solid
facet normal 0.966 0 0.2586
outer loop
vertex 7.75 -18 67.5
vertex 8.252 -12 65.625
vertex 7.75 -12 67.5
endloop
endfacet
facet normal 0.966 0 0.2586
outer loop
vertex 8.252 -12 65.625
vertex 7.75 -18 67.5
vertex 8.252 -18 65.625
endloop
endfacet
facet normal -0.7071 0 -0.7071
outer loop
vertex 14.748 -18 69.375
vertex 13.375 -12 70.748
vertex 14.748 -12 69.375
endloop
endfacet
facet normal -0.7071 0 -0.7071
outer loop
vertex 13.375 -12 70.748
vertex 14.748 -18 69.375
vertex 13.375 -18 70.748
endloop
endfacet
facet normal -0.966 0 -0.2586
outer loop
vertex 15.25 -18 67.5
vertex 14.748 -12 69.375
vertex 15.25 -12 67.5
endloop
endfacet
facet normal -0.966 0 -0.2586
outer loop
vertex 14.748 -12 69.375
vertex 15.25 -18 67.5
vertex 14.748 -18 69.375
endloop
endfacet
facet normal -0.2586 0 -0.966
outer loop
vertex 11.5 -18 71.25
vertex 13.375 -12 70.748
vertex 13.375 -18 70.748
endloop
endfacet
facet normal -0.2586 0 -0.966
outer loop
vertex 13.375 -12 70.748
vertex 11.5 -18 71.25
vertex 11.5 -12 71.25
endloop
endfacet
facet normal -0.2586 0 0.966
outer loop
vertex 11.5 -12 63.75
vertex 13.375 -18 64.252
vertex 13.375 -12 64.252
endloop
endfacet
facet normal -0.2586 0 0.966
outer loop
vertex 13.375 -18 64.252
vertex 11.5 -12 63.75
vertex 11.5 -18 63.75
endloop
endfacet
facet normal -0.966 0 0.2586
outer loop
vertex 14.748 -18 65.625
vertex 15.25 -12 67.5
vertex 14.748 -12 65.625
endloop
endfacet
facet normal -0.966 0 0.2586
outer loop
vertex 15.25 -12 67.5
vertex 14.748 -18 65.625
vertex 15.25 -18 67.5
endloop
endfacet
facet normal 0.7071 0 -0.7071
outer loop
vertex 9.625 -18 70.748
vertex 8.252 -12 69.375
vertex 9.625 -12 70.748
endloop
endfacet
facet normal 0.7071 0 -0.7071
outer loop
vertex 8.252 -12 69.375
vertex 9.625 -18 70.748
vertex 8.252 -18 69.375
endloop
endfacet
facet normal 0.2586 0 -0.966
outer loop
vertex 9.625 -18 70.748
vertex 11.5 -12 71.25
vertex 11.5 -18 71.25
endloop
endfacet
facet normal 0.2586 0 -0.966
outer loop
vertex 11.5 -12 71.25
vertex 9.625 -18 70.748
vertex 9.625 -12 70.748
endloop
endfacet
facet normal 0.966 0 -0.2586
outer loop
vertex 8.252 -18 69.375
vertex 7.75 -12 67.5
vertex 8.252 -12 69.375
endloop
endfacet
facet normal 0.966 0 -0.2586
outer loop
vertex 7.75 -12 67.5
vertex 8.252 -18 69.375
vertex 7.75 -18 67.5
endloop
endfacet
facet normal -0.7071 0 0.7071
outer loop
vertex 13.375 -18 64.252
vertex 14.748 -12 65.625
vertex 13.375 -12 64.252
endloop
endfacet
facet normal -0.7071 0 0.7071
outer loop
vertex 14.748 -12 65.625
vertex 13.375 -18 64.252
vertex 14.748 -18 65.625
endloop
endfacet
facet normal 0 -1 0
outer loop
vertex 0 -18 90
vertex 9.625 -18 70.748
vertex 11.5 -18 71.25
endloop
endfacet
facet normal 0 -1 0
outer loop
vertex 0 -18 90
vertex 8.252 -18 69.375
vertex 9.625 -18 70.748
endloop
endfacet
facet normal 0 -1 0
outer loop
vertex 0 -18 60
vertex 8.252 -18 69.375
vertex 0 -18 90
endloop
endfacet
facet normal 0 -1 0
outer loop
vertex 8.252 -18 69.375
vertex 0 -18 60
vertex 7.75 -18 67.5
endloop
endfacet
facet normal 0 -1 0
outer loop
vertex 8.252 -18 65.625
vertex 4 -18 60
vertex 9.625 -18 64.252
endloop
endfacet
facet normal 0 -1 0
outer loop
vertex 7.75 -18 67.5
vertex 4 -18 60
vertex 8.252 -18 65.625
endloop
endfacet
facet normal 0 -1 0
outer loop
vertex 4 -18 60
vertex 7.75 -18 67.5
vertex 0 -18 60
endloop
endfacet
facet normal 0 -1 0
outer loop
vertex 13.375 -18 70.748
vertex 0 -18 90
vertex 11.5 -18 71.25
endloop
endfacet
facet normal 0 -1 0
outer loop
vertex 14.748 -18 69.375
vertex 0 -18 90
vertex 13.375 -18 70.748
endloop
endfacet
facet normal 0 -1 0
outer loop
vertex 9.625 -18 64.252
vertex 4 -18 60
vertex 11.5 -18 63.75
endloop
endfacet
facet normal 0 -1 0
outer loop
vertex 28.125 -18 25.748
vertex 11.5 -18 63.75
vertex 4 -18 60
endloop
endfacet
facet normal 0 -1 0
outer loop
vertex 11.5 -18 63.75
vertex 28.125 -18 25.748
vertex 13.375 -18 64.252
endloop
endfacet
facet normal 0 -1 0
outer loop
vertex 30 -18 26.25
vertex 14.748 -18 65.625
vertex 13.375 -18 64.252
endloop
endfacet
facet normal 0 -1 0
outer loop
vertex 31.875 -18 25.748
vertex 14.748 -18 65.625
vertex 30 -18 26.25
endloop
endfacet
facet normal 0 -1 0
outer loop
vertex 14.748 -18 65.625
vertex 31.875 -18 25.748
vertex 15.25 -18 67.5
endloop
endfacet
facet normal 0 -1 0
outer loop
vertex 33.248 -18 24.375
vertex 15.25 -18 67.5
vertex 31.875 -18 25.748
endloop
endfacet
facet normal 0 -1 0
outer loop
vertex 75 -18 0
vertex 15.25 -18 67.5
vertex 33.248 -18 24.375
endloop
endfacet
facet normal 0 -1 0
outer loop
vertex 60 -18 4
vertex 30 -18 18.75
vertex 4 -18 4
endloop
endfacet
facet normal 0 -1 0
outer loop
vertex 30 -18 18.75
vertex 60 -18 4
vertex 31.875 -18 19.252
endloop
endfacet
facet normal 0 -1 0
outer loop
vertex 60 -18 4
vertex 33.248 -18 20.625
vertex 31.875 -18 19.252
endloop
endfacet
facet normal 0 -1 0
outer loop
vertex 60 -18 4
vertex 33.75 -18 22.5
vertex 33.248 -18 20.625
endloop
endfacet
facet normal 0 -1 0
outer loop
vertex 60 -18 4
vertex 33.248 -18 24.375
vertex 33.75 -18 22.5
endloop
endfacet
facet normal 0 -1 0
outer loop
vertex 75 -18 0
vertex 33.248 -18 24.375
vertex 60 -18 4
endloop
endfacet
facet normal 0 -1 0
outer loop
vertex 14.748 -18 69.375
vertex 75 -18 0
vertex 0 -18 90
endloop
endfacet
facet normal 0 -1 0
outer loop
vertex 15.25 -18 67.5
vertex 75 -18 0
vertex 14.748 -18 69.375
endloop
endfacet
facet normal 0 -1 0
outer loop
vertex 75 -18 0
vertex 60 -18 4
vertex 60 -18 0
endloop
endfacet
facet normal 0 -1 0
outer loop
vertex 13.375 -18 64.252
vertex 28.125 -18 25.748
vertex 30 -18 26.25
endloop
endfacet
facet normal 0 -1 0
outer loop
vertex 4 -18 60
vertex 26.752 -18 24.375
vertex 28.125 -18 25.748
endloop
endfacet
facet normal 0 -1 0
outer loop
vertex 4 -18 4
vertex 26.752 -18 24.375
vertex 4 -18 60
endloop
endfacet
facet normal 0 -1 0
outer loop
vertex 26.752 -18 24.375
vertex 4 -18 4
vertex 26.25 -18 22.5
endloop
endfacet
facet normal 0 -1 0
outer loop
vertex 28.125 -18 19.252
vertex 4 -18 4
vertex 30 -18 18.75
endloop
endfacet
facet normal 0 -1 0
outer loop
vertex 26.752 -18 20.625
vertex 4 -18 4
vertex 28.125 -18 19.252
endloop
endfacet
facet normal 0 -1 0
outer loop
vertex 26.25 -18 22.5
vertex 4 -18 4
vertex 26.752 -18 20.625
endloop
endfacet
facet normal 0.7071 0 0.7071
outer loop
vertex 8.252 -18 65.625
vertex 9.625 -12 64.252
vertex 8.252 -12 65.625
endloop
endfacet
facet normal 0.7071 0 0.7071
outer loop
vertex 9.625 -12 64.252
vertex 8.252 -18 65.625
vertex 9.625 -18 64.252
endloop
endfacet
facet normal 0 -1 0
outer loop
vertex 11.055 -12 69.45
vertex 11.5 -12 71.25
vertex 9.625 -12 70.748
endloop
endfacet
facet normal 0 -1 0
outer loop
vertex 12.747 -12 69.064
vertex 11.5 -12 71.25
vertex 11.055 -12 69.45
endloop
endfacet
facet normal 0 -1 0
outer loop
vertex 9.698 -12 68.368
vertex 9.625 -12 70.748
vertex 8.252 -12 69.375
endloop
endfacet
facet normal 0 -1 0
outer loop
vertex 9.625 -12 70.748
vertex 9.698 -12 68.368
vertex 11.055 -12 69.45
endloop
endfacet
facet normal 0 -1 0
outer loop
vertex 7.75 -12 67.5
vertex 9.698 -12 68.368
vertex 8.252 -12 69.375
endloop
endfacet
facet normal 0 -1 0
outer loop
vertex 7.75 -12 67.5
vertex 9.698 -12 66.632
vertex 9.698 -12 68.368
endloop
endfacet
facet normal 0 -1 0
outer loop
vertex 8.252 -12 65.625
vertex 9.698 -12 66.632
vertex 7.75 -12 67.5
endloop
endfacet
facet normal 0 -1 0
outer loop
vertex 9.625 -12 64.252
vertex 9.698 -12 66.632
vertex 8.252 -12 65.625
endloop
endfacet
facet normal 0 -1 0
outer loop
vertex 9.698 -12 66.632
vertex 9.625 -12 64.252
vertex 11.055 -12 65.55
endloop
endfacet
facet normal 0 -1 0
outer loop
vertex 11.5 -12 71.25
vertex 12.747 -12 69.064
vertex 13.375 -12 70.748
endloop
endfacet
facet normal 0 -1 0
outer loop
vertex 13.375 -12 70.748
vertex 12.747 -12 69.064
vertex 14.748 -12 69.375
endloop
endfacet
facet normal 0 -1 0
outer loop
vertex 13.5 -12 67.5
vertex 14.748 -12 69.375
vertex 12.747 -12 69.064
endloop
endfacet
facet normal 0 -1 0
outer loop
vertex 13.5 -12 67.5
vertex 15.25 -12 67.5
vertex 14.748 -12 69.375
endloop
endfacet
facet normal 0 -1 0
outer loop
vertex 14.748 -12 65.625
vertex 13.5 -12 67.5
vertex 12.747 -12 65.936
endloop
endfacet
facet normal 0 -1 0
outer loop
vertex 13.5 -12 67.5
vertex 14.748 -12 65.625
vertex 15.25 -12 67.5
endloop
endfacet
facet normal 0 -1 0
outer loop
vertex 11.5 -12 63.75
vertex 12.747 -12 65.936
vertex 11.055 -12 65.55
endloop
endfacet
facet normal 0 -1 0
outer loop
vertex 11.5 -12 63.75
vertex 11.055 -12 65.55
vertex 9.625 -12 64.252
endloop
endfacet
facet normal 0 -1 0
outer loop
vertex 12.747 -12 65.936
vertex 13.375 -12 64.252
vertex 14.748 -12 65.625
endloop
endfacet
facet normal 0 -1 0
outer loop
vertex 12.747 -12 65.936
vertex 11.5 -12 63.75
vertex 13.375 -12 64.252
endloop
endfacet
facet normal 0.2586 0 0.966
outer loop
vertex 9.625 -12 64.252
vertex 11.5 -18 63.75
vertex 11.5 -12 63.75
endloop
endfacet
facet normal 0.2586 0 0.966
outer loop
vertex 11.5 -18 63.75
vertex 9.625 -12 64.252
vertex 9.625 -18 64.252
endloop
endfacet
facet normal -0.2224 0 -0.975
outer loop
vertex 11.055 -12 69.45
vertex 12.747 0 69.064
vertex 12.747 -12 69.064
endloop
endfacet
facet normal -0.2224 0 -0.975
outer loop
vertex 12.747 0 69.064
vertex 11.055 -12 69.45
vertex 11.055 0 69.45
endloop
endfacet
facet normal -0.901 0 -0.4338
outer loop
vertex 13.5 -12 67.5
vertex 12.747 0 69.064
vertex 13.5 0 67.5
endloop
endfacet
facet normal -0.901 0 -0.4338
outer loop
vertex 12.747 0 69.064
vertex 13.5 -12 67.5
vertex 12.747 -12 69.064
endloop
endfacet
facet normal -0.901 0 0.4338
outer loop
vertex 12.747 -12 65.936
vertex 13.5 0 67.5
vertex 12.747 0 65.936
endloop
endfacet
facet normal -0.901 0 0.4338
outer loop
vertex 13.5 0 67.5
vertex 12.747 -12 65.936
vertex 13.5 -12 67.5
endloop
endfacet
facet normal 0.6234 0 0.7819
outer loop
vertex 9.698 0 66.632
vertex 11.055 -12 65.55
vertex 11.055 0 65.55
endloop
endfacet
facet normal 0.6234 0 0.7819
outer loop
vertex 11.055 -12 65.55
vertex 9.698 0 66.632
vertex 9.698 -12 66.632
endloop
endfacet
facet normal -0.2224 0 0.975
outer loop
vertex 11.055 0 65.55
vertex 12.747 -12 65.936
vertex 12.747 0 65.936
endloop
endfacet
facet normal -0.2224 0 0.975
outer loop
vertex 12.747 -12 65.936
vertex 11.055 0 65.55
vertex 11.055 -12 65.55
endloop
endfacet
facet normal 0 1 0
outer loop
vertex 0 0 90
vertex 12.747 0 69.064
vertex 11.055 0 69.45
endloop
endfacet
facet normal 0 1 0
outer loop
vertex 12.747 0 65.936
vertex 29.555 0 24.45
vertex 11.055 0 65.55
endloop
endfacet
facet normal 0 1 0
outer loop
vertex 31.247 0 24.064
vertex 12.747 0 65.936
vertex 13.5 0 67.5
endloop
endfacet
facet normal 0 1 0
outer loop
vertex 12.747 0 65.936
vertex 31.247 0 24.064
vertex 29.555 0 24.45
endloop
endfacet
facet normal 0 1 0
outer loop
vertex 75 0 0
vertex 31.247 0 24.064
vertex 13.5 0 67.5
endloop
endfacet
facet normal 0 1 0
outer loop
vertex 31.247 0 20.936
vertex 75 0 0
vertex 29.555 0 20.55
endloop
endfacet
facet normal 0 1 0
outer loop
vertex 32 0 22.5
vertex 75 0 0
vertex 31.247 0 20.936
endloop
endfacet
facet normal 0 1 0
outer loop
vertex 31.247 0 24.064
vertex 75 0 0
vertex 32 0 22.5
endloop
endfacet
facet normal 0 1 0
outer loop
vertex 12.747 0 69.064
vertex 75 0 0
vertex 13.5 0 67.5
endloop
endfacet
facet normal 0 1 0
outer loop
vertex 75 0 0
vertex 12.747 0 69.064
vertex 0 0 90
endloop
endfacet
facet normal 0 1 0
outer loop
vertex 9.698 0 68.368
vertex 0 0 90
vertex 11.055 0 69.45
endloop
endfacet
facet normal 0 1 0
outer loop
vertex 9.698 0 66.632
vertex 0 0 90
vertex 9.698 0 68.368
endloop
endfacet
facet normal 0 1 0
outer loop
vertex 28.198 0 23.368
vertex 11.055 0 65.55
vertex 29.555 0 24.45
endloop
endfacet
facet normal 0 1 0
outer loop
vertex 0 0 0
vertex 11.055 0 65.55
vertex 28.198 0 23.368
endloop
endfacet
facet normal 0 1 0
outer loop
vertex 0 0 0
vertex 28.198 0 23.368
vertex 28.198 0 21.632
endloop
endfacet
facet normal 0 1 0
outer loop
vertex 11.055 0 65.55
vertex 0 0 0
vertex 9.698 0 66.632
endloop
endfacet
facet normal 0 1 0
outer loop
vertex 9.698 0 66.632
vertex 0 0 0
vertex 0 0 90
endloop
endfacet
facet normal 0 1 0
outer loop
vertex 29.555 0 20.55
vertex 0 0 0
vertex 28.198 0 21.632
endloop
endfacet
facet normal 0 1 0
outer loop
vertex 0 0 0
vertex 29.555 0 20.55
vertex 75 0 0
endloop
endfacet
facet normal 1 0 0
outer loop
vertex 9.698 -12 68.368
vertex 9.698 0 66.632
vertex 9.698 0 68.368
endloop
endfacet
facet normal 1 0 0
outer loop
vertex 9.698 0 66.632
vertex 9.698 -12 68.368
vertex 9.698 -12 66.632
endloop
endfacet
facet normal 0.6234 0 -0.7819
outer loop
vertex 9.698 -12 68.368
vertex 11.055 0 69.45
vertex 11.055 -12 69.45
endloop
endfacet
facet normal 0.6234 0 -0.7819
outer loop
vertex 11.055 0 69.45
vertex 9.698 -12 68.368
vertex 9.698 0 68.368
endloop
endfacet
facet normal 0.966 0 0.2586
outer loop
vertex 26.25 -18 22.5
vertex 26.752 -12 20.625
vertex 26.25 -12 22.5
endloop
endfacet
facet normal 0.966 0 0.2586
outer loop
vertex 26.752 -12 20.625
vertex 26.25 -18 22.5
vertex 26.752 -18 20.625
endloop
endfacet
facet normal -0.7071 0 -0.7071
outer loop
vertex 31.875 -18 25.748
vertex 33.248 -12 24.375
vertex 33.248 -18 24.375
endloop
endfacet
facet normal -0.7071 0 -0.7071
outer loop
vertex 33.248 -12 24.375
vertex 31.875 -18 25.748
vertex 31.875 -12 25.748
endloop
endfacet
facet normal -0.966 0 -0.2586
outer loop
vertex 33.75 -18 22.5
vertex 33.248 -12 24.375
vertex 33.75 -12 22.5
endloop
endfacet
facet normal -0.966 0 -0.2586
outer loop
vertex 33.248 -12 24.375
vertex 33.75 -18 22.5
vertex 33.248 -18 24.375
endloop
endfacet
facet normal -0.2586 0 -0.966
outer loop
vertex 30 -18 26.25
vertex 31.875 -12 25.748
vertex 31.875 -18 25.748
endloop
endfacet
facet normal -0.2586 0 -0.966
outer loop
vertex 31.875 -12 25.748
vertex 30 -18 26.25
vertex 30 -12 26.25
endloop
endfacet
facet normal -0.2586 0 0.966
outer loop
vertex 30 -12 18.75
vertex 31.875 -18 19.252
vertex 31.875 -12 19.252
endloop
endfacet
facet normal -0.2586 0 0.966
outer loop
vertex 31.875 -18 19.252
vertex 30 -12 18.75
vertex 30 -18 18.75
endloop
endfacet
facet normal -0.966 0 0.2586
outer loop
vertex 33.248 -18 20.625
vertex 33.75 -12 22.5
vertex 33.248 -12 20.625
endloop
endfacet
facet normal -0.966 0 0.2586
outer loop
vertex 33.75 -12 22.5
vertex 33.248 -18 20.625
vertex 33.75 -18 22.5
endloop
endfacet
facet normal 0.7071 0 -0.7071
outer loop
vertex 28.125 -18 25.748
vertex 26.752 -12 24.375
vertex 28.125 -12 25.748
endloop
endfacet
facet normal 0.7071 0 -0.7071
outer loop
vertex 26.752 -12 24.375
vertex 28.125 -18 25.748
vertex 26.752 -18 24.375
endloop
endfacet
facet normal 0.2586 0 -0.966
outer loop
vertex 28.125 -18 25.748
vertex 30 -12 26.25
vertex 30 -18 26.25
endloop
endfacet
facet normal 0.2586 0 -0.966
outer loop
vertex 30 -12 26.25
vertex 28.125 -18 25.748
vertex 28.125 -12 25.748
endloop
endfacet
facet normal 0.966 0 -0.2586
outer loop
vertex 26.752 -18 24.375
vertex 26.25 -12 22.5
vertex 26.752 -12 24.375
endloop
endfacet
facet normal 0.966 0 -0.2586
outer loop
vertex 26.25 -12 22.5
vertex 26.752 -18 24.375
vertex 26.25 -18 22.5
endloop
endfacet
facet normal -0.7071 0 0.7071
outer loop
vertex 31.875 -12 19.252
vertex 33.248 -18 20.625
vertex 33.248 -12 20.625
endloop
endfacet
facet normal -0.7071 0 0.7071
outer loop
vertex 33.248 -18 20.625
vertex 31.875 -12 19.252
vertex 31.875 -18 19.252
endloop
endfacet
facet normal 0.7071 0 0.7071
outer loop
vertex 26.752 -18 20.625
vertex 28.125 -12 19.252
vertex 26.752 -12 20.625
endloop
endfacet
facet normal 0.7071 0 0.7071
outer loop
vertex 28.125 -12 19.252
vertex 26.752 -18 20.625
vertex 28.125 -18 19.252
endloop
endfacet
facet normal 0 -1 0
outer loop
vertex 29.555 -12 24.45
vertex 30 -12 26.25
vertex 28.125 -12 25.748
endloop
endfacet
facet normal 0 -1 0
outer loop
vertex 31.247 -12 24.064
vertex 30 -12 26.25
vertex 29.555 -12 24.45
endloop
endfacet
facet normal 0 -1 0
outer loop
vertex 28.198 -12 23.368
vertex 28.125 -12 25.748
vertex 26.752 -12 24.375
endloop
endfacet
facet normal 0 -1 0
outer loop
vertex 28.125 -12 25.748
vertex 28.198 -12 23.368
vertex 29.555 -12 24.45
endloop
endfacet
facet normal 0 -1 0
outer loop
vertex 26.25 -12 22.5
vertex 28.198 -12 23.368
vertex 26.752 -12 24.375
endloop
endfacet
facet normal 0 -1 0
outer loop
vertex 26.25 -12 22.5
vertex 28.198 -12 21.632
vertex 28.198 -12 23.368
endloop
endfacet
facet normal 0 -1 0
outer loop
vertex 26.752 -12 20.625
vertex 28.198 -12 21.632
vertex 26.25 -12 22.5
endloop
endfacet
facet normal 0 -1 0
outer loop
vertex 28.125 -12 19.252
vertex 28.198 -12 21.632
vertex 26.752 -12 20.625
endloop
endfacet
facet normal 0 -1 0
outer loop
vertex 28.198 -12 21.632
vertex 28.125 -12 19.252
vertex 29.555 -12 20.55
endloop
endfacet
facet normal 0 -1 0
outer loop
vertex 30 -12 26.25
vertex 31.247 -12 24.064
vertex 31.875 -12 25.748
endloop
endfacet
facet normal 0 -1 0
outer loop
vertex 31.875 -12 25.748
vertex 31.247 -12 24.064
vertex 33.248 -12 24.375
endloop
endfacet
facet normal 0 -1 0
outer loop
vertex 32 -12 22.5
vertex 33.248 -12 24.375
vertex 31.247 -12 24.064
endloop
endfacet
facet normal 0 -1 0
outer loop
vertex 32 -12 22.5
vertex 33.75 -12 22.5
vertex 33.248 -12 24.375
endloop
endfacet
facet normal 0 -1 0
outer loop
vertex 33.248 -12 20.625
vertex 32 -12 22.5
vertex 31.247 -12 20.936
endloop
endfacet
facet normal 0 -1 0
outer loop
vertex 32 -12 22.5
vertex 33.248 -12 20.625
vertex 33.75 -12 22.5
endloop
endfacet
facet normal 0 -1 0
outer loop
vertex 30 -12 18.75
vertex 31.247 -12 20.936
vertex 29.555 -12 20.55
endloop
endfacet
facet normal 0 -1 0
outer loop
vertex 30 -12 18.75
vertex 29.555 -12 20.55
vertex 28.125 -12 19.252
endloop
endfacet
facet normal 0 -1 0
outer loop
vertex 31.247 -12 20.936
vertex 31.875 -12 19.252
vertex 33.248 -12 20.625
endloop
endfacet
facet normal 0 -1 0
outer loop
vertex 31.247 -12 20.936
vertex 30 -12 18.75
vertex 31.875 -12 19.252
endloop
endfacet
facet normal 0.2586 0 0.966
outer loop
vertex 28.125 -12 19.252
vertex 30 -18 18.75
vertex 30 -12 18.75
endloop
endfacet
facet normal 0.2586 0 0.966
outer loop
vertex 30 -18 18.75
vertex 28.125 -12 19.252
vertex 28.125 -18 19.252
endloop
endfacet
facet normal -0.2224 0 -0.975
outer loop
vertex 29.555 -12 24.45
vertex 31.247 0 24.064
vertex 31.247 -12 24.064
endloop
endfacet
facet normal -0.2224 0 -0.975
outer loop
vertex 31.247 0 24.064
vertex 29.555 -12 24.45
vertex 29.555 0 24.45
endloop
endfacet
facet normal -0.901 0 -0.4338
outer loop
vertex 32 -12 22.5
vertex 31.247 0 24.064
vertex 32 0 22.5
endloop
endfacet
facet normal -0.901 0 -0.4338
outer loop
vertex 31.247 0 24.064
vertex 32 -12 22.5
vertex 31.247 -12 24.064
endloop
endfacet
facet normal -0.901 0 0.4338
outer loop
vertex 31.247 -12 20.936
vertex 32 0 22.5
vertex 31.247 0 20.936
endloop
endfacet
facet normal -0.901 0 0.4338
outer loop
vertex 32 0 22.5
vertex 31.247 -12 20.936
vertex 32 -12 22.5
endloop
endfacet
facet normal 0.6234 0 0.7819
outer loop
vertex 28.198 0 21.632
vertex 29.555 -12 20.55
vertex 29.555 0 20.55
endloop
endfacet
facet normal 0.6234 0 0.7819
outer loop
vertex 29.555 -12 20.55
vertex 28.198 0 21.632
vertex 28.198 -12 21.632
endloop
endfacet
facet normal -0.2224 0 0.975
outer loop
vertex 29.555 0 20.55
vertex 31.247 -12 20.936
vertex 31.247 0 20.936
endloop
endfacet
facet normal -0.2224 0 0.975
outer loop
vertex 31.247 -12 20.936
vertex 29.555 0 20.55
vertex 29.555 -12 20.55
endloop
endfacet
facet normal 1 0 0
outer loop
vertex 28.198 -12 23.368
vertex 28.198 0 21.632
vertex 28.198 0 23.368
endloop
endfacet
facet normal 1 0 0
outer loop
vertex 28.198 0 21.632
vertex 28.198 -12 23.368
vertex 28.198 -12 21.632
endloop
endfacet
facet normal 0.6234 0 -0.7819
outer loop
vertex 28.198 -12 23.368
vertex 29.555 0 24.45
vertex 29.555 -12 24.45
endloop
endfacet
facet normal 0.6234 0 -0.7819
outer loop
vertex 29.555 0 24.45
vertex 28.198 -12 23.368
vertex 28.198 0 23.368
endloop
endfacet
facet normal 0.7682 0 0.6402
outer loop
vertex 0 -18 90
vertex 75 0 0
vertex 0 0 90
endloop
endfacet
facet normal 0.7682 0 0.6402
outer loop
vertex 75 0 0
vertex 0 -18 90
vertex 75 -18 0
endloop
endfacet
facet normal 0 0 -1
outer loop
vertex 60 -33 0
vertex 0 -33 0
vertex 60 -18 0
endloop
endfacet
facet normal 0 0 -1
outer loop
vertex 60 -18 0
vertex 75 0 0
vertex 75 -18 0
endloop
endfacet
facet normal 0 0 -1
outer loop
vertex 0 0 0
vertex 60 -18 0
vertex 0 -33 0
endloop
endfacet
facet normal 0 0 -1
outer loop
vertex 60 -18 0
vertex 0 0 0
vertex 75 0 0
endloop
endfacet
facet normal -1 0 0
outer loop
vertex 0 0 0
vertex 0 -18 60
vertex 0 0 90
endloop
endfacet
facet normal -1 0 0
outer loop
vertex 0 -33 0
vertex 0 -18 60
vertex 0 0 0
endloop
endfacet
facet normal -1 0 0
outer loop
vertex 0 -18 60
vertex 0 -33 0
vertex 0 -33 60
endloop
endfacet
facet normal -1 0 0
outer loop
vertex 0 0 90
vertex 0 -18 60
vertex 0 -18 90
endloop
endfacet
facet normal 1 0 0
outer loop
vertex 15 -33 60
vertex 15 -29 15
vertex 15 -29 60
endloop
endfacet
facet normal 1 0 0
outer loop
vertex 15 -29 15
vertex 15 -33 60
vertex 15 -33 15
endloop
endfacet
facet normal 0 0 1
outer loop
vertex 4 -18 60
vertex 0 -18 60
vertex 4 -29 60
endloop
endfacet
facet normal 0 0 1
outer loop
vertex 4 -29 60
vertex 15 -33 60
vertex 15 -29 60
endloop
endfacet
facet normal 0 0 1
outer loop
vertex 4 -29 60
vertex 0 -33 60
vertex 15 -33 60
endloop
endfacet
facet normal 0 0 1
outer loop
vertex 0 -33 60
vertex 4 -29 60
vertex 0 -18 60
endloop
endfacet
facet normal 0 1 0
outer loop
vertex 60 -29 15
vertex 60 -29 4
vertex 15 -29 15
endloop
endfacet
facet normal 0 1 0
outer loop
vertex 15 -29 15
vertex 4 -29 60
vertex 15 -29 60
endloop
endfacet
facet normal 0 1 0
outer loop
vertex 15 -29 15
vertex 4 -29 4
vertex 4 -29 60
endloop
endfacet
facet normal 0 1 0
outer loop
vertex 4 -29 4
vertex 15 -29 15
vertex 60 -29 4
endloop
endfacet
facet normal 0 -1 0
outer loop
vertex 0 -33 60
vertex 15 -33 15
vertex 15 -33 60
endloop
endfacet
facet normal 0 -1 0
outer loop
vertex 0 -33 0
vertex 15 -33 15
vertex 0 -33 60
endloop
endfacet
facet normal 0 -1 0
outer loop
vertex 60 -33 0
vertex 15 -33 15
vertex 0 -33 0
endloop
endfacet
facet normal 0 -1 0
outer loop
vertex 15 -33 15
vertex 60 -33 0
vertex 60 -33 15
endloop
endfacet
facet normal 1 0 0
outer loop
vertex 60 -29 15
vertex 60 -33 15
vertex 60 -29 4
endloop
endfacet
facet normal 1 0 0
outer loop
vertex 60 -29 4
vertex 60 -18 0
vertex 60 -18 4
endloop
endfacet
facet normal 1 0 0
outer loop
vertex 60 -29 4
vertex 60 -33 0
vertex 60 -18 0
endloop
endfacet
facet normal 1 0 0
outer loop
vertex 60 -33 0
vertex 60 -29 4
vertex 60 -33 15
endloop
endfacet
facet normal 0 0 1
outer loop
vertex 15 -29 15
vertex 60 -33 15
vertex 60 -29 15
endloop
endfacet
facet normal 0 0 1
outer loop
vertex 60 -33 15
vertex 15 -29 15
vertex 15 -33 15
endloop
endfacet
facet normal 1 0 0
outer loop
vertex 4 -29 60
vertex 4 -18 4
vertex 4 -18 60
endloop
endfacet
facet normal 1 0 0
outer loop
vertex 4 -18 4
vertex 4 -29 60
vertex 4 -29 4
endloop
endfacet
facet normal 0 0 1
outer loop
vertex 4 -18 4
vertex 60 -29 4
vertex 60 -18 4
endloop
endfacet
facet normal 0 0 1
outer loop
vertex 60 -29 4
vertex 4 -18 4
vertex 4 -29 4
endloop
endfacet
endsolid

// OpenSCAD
// Height of front bezel
front_left_height = 60;

// Width of front bezel
front_left_width = 15;

// Height of the bottom bezel
front_bottom_height = 15;

// Width of the bottom bezel
front_bottom_width = 60;

// Distance/thickness to mount off of wall (back place thickness)
distance_from_wall = 18;

// Thickness of wall mounts
wall_thickness = 4;

// Tablet Thickness
tablet_thickness = 11;

// Radius of screw holes
screw_head_radius = 7.5;
screw_radius = 4;
screw_head_height = 6;

// Define a screwhole (X/Y at center, z at face surface)
module sunken_screw_hole()
{  
    union()
    {
        // Head
        translate([0,0,-(screw_head_height)])
        cylinder(h = screw_head_height, 
        d1 = screw_head_radius, 
        d2 = screw_head_radius, 
        center = false);
        
        //screw thread
        translate([0,0,-distance_from_wall])
        cylinder(h = (distance_from_wall),
        d1 = screw_radius,
        d2 = screw_radius,
        center = false);
    }
}

// Back plate/triangle
difference()
{
    // Back plate
    rotate([90,0,0])
    translate([0,0,0])
    linear_extrude(height=distance_from_wall)
    {
            polygon(points=[[0,0],[front_bottom_width+(screw_head_radius*2),0],[0,front_left_height+(screw_head_radius*4)]], paths=[[0,1,2]]);
    }
    
    // Top screw hole
    rotate([90,0,0])
    translate([wall_thickness+screw_head_radius,
    front_left_height+screw_head_radius,
    distance_from_wall])
    
    #sunken_screw_hole();
    
    // Botton screw hole
    rotate([90,0,0])
    translate([front_bottom_width/2,
    front_bottom_height+screw_head_radius,
    distance_from_wall])
    
    #sunken_screw_hole();
}

// Front left
rotate([0,0,0])
translate([0,-(wall_thickness+distance_from_wall+tablet_thickness),0])
cube([front_left_width,wall_thickness,front_left_height], center=false);

// Front bottom
rotate([0,0,0])
translate([0,-(wall_thickness+distance_from_wall+tablet_thickness),0])
cube([front_bottom_width,wall_thickness,front_bottom_height], center=false);

// Left edge
rotate([0,0,0])
translate([0,-(distance_from_wall+tablet_thickness),0])
cube([wall_thickness,tablet_thickness,front_left_height], center=false);

// Bottom
rotate([0,0,0])
translate([0,-(distance_from_wall+tablet_thickness),0])
cube([front_bottom_width,tablet_thickness,wall_thickness], center=false);
